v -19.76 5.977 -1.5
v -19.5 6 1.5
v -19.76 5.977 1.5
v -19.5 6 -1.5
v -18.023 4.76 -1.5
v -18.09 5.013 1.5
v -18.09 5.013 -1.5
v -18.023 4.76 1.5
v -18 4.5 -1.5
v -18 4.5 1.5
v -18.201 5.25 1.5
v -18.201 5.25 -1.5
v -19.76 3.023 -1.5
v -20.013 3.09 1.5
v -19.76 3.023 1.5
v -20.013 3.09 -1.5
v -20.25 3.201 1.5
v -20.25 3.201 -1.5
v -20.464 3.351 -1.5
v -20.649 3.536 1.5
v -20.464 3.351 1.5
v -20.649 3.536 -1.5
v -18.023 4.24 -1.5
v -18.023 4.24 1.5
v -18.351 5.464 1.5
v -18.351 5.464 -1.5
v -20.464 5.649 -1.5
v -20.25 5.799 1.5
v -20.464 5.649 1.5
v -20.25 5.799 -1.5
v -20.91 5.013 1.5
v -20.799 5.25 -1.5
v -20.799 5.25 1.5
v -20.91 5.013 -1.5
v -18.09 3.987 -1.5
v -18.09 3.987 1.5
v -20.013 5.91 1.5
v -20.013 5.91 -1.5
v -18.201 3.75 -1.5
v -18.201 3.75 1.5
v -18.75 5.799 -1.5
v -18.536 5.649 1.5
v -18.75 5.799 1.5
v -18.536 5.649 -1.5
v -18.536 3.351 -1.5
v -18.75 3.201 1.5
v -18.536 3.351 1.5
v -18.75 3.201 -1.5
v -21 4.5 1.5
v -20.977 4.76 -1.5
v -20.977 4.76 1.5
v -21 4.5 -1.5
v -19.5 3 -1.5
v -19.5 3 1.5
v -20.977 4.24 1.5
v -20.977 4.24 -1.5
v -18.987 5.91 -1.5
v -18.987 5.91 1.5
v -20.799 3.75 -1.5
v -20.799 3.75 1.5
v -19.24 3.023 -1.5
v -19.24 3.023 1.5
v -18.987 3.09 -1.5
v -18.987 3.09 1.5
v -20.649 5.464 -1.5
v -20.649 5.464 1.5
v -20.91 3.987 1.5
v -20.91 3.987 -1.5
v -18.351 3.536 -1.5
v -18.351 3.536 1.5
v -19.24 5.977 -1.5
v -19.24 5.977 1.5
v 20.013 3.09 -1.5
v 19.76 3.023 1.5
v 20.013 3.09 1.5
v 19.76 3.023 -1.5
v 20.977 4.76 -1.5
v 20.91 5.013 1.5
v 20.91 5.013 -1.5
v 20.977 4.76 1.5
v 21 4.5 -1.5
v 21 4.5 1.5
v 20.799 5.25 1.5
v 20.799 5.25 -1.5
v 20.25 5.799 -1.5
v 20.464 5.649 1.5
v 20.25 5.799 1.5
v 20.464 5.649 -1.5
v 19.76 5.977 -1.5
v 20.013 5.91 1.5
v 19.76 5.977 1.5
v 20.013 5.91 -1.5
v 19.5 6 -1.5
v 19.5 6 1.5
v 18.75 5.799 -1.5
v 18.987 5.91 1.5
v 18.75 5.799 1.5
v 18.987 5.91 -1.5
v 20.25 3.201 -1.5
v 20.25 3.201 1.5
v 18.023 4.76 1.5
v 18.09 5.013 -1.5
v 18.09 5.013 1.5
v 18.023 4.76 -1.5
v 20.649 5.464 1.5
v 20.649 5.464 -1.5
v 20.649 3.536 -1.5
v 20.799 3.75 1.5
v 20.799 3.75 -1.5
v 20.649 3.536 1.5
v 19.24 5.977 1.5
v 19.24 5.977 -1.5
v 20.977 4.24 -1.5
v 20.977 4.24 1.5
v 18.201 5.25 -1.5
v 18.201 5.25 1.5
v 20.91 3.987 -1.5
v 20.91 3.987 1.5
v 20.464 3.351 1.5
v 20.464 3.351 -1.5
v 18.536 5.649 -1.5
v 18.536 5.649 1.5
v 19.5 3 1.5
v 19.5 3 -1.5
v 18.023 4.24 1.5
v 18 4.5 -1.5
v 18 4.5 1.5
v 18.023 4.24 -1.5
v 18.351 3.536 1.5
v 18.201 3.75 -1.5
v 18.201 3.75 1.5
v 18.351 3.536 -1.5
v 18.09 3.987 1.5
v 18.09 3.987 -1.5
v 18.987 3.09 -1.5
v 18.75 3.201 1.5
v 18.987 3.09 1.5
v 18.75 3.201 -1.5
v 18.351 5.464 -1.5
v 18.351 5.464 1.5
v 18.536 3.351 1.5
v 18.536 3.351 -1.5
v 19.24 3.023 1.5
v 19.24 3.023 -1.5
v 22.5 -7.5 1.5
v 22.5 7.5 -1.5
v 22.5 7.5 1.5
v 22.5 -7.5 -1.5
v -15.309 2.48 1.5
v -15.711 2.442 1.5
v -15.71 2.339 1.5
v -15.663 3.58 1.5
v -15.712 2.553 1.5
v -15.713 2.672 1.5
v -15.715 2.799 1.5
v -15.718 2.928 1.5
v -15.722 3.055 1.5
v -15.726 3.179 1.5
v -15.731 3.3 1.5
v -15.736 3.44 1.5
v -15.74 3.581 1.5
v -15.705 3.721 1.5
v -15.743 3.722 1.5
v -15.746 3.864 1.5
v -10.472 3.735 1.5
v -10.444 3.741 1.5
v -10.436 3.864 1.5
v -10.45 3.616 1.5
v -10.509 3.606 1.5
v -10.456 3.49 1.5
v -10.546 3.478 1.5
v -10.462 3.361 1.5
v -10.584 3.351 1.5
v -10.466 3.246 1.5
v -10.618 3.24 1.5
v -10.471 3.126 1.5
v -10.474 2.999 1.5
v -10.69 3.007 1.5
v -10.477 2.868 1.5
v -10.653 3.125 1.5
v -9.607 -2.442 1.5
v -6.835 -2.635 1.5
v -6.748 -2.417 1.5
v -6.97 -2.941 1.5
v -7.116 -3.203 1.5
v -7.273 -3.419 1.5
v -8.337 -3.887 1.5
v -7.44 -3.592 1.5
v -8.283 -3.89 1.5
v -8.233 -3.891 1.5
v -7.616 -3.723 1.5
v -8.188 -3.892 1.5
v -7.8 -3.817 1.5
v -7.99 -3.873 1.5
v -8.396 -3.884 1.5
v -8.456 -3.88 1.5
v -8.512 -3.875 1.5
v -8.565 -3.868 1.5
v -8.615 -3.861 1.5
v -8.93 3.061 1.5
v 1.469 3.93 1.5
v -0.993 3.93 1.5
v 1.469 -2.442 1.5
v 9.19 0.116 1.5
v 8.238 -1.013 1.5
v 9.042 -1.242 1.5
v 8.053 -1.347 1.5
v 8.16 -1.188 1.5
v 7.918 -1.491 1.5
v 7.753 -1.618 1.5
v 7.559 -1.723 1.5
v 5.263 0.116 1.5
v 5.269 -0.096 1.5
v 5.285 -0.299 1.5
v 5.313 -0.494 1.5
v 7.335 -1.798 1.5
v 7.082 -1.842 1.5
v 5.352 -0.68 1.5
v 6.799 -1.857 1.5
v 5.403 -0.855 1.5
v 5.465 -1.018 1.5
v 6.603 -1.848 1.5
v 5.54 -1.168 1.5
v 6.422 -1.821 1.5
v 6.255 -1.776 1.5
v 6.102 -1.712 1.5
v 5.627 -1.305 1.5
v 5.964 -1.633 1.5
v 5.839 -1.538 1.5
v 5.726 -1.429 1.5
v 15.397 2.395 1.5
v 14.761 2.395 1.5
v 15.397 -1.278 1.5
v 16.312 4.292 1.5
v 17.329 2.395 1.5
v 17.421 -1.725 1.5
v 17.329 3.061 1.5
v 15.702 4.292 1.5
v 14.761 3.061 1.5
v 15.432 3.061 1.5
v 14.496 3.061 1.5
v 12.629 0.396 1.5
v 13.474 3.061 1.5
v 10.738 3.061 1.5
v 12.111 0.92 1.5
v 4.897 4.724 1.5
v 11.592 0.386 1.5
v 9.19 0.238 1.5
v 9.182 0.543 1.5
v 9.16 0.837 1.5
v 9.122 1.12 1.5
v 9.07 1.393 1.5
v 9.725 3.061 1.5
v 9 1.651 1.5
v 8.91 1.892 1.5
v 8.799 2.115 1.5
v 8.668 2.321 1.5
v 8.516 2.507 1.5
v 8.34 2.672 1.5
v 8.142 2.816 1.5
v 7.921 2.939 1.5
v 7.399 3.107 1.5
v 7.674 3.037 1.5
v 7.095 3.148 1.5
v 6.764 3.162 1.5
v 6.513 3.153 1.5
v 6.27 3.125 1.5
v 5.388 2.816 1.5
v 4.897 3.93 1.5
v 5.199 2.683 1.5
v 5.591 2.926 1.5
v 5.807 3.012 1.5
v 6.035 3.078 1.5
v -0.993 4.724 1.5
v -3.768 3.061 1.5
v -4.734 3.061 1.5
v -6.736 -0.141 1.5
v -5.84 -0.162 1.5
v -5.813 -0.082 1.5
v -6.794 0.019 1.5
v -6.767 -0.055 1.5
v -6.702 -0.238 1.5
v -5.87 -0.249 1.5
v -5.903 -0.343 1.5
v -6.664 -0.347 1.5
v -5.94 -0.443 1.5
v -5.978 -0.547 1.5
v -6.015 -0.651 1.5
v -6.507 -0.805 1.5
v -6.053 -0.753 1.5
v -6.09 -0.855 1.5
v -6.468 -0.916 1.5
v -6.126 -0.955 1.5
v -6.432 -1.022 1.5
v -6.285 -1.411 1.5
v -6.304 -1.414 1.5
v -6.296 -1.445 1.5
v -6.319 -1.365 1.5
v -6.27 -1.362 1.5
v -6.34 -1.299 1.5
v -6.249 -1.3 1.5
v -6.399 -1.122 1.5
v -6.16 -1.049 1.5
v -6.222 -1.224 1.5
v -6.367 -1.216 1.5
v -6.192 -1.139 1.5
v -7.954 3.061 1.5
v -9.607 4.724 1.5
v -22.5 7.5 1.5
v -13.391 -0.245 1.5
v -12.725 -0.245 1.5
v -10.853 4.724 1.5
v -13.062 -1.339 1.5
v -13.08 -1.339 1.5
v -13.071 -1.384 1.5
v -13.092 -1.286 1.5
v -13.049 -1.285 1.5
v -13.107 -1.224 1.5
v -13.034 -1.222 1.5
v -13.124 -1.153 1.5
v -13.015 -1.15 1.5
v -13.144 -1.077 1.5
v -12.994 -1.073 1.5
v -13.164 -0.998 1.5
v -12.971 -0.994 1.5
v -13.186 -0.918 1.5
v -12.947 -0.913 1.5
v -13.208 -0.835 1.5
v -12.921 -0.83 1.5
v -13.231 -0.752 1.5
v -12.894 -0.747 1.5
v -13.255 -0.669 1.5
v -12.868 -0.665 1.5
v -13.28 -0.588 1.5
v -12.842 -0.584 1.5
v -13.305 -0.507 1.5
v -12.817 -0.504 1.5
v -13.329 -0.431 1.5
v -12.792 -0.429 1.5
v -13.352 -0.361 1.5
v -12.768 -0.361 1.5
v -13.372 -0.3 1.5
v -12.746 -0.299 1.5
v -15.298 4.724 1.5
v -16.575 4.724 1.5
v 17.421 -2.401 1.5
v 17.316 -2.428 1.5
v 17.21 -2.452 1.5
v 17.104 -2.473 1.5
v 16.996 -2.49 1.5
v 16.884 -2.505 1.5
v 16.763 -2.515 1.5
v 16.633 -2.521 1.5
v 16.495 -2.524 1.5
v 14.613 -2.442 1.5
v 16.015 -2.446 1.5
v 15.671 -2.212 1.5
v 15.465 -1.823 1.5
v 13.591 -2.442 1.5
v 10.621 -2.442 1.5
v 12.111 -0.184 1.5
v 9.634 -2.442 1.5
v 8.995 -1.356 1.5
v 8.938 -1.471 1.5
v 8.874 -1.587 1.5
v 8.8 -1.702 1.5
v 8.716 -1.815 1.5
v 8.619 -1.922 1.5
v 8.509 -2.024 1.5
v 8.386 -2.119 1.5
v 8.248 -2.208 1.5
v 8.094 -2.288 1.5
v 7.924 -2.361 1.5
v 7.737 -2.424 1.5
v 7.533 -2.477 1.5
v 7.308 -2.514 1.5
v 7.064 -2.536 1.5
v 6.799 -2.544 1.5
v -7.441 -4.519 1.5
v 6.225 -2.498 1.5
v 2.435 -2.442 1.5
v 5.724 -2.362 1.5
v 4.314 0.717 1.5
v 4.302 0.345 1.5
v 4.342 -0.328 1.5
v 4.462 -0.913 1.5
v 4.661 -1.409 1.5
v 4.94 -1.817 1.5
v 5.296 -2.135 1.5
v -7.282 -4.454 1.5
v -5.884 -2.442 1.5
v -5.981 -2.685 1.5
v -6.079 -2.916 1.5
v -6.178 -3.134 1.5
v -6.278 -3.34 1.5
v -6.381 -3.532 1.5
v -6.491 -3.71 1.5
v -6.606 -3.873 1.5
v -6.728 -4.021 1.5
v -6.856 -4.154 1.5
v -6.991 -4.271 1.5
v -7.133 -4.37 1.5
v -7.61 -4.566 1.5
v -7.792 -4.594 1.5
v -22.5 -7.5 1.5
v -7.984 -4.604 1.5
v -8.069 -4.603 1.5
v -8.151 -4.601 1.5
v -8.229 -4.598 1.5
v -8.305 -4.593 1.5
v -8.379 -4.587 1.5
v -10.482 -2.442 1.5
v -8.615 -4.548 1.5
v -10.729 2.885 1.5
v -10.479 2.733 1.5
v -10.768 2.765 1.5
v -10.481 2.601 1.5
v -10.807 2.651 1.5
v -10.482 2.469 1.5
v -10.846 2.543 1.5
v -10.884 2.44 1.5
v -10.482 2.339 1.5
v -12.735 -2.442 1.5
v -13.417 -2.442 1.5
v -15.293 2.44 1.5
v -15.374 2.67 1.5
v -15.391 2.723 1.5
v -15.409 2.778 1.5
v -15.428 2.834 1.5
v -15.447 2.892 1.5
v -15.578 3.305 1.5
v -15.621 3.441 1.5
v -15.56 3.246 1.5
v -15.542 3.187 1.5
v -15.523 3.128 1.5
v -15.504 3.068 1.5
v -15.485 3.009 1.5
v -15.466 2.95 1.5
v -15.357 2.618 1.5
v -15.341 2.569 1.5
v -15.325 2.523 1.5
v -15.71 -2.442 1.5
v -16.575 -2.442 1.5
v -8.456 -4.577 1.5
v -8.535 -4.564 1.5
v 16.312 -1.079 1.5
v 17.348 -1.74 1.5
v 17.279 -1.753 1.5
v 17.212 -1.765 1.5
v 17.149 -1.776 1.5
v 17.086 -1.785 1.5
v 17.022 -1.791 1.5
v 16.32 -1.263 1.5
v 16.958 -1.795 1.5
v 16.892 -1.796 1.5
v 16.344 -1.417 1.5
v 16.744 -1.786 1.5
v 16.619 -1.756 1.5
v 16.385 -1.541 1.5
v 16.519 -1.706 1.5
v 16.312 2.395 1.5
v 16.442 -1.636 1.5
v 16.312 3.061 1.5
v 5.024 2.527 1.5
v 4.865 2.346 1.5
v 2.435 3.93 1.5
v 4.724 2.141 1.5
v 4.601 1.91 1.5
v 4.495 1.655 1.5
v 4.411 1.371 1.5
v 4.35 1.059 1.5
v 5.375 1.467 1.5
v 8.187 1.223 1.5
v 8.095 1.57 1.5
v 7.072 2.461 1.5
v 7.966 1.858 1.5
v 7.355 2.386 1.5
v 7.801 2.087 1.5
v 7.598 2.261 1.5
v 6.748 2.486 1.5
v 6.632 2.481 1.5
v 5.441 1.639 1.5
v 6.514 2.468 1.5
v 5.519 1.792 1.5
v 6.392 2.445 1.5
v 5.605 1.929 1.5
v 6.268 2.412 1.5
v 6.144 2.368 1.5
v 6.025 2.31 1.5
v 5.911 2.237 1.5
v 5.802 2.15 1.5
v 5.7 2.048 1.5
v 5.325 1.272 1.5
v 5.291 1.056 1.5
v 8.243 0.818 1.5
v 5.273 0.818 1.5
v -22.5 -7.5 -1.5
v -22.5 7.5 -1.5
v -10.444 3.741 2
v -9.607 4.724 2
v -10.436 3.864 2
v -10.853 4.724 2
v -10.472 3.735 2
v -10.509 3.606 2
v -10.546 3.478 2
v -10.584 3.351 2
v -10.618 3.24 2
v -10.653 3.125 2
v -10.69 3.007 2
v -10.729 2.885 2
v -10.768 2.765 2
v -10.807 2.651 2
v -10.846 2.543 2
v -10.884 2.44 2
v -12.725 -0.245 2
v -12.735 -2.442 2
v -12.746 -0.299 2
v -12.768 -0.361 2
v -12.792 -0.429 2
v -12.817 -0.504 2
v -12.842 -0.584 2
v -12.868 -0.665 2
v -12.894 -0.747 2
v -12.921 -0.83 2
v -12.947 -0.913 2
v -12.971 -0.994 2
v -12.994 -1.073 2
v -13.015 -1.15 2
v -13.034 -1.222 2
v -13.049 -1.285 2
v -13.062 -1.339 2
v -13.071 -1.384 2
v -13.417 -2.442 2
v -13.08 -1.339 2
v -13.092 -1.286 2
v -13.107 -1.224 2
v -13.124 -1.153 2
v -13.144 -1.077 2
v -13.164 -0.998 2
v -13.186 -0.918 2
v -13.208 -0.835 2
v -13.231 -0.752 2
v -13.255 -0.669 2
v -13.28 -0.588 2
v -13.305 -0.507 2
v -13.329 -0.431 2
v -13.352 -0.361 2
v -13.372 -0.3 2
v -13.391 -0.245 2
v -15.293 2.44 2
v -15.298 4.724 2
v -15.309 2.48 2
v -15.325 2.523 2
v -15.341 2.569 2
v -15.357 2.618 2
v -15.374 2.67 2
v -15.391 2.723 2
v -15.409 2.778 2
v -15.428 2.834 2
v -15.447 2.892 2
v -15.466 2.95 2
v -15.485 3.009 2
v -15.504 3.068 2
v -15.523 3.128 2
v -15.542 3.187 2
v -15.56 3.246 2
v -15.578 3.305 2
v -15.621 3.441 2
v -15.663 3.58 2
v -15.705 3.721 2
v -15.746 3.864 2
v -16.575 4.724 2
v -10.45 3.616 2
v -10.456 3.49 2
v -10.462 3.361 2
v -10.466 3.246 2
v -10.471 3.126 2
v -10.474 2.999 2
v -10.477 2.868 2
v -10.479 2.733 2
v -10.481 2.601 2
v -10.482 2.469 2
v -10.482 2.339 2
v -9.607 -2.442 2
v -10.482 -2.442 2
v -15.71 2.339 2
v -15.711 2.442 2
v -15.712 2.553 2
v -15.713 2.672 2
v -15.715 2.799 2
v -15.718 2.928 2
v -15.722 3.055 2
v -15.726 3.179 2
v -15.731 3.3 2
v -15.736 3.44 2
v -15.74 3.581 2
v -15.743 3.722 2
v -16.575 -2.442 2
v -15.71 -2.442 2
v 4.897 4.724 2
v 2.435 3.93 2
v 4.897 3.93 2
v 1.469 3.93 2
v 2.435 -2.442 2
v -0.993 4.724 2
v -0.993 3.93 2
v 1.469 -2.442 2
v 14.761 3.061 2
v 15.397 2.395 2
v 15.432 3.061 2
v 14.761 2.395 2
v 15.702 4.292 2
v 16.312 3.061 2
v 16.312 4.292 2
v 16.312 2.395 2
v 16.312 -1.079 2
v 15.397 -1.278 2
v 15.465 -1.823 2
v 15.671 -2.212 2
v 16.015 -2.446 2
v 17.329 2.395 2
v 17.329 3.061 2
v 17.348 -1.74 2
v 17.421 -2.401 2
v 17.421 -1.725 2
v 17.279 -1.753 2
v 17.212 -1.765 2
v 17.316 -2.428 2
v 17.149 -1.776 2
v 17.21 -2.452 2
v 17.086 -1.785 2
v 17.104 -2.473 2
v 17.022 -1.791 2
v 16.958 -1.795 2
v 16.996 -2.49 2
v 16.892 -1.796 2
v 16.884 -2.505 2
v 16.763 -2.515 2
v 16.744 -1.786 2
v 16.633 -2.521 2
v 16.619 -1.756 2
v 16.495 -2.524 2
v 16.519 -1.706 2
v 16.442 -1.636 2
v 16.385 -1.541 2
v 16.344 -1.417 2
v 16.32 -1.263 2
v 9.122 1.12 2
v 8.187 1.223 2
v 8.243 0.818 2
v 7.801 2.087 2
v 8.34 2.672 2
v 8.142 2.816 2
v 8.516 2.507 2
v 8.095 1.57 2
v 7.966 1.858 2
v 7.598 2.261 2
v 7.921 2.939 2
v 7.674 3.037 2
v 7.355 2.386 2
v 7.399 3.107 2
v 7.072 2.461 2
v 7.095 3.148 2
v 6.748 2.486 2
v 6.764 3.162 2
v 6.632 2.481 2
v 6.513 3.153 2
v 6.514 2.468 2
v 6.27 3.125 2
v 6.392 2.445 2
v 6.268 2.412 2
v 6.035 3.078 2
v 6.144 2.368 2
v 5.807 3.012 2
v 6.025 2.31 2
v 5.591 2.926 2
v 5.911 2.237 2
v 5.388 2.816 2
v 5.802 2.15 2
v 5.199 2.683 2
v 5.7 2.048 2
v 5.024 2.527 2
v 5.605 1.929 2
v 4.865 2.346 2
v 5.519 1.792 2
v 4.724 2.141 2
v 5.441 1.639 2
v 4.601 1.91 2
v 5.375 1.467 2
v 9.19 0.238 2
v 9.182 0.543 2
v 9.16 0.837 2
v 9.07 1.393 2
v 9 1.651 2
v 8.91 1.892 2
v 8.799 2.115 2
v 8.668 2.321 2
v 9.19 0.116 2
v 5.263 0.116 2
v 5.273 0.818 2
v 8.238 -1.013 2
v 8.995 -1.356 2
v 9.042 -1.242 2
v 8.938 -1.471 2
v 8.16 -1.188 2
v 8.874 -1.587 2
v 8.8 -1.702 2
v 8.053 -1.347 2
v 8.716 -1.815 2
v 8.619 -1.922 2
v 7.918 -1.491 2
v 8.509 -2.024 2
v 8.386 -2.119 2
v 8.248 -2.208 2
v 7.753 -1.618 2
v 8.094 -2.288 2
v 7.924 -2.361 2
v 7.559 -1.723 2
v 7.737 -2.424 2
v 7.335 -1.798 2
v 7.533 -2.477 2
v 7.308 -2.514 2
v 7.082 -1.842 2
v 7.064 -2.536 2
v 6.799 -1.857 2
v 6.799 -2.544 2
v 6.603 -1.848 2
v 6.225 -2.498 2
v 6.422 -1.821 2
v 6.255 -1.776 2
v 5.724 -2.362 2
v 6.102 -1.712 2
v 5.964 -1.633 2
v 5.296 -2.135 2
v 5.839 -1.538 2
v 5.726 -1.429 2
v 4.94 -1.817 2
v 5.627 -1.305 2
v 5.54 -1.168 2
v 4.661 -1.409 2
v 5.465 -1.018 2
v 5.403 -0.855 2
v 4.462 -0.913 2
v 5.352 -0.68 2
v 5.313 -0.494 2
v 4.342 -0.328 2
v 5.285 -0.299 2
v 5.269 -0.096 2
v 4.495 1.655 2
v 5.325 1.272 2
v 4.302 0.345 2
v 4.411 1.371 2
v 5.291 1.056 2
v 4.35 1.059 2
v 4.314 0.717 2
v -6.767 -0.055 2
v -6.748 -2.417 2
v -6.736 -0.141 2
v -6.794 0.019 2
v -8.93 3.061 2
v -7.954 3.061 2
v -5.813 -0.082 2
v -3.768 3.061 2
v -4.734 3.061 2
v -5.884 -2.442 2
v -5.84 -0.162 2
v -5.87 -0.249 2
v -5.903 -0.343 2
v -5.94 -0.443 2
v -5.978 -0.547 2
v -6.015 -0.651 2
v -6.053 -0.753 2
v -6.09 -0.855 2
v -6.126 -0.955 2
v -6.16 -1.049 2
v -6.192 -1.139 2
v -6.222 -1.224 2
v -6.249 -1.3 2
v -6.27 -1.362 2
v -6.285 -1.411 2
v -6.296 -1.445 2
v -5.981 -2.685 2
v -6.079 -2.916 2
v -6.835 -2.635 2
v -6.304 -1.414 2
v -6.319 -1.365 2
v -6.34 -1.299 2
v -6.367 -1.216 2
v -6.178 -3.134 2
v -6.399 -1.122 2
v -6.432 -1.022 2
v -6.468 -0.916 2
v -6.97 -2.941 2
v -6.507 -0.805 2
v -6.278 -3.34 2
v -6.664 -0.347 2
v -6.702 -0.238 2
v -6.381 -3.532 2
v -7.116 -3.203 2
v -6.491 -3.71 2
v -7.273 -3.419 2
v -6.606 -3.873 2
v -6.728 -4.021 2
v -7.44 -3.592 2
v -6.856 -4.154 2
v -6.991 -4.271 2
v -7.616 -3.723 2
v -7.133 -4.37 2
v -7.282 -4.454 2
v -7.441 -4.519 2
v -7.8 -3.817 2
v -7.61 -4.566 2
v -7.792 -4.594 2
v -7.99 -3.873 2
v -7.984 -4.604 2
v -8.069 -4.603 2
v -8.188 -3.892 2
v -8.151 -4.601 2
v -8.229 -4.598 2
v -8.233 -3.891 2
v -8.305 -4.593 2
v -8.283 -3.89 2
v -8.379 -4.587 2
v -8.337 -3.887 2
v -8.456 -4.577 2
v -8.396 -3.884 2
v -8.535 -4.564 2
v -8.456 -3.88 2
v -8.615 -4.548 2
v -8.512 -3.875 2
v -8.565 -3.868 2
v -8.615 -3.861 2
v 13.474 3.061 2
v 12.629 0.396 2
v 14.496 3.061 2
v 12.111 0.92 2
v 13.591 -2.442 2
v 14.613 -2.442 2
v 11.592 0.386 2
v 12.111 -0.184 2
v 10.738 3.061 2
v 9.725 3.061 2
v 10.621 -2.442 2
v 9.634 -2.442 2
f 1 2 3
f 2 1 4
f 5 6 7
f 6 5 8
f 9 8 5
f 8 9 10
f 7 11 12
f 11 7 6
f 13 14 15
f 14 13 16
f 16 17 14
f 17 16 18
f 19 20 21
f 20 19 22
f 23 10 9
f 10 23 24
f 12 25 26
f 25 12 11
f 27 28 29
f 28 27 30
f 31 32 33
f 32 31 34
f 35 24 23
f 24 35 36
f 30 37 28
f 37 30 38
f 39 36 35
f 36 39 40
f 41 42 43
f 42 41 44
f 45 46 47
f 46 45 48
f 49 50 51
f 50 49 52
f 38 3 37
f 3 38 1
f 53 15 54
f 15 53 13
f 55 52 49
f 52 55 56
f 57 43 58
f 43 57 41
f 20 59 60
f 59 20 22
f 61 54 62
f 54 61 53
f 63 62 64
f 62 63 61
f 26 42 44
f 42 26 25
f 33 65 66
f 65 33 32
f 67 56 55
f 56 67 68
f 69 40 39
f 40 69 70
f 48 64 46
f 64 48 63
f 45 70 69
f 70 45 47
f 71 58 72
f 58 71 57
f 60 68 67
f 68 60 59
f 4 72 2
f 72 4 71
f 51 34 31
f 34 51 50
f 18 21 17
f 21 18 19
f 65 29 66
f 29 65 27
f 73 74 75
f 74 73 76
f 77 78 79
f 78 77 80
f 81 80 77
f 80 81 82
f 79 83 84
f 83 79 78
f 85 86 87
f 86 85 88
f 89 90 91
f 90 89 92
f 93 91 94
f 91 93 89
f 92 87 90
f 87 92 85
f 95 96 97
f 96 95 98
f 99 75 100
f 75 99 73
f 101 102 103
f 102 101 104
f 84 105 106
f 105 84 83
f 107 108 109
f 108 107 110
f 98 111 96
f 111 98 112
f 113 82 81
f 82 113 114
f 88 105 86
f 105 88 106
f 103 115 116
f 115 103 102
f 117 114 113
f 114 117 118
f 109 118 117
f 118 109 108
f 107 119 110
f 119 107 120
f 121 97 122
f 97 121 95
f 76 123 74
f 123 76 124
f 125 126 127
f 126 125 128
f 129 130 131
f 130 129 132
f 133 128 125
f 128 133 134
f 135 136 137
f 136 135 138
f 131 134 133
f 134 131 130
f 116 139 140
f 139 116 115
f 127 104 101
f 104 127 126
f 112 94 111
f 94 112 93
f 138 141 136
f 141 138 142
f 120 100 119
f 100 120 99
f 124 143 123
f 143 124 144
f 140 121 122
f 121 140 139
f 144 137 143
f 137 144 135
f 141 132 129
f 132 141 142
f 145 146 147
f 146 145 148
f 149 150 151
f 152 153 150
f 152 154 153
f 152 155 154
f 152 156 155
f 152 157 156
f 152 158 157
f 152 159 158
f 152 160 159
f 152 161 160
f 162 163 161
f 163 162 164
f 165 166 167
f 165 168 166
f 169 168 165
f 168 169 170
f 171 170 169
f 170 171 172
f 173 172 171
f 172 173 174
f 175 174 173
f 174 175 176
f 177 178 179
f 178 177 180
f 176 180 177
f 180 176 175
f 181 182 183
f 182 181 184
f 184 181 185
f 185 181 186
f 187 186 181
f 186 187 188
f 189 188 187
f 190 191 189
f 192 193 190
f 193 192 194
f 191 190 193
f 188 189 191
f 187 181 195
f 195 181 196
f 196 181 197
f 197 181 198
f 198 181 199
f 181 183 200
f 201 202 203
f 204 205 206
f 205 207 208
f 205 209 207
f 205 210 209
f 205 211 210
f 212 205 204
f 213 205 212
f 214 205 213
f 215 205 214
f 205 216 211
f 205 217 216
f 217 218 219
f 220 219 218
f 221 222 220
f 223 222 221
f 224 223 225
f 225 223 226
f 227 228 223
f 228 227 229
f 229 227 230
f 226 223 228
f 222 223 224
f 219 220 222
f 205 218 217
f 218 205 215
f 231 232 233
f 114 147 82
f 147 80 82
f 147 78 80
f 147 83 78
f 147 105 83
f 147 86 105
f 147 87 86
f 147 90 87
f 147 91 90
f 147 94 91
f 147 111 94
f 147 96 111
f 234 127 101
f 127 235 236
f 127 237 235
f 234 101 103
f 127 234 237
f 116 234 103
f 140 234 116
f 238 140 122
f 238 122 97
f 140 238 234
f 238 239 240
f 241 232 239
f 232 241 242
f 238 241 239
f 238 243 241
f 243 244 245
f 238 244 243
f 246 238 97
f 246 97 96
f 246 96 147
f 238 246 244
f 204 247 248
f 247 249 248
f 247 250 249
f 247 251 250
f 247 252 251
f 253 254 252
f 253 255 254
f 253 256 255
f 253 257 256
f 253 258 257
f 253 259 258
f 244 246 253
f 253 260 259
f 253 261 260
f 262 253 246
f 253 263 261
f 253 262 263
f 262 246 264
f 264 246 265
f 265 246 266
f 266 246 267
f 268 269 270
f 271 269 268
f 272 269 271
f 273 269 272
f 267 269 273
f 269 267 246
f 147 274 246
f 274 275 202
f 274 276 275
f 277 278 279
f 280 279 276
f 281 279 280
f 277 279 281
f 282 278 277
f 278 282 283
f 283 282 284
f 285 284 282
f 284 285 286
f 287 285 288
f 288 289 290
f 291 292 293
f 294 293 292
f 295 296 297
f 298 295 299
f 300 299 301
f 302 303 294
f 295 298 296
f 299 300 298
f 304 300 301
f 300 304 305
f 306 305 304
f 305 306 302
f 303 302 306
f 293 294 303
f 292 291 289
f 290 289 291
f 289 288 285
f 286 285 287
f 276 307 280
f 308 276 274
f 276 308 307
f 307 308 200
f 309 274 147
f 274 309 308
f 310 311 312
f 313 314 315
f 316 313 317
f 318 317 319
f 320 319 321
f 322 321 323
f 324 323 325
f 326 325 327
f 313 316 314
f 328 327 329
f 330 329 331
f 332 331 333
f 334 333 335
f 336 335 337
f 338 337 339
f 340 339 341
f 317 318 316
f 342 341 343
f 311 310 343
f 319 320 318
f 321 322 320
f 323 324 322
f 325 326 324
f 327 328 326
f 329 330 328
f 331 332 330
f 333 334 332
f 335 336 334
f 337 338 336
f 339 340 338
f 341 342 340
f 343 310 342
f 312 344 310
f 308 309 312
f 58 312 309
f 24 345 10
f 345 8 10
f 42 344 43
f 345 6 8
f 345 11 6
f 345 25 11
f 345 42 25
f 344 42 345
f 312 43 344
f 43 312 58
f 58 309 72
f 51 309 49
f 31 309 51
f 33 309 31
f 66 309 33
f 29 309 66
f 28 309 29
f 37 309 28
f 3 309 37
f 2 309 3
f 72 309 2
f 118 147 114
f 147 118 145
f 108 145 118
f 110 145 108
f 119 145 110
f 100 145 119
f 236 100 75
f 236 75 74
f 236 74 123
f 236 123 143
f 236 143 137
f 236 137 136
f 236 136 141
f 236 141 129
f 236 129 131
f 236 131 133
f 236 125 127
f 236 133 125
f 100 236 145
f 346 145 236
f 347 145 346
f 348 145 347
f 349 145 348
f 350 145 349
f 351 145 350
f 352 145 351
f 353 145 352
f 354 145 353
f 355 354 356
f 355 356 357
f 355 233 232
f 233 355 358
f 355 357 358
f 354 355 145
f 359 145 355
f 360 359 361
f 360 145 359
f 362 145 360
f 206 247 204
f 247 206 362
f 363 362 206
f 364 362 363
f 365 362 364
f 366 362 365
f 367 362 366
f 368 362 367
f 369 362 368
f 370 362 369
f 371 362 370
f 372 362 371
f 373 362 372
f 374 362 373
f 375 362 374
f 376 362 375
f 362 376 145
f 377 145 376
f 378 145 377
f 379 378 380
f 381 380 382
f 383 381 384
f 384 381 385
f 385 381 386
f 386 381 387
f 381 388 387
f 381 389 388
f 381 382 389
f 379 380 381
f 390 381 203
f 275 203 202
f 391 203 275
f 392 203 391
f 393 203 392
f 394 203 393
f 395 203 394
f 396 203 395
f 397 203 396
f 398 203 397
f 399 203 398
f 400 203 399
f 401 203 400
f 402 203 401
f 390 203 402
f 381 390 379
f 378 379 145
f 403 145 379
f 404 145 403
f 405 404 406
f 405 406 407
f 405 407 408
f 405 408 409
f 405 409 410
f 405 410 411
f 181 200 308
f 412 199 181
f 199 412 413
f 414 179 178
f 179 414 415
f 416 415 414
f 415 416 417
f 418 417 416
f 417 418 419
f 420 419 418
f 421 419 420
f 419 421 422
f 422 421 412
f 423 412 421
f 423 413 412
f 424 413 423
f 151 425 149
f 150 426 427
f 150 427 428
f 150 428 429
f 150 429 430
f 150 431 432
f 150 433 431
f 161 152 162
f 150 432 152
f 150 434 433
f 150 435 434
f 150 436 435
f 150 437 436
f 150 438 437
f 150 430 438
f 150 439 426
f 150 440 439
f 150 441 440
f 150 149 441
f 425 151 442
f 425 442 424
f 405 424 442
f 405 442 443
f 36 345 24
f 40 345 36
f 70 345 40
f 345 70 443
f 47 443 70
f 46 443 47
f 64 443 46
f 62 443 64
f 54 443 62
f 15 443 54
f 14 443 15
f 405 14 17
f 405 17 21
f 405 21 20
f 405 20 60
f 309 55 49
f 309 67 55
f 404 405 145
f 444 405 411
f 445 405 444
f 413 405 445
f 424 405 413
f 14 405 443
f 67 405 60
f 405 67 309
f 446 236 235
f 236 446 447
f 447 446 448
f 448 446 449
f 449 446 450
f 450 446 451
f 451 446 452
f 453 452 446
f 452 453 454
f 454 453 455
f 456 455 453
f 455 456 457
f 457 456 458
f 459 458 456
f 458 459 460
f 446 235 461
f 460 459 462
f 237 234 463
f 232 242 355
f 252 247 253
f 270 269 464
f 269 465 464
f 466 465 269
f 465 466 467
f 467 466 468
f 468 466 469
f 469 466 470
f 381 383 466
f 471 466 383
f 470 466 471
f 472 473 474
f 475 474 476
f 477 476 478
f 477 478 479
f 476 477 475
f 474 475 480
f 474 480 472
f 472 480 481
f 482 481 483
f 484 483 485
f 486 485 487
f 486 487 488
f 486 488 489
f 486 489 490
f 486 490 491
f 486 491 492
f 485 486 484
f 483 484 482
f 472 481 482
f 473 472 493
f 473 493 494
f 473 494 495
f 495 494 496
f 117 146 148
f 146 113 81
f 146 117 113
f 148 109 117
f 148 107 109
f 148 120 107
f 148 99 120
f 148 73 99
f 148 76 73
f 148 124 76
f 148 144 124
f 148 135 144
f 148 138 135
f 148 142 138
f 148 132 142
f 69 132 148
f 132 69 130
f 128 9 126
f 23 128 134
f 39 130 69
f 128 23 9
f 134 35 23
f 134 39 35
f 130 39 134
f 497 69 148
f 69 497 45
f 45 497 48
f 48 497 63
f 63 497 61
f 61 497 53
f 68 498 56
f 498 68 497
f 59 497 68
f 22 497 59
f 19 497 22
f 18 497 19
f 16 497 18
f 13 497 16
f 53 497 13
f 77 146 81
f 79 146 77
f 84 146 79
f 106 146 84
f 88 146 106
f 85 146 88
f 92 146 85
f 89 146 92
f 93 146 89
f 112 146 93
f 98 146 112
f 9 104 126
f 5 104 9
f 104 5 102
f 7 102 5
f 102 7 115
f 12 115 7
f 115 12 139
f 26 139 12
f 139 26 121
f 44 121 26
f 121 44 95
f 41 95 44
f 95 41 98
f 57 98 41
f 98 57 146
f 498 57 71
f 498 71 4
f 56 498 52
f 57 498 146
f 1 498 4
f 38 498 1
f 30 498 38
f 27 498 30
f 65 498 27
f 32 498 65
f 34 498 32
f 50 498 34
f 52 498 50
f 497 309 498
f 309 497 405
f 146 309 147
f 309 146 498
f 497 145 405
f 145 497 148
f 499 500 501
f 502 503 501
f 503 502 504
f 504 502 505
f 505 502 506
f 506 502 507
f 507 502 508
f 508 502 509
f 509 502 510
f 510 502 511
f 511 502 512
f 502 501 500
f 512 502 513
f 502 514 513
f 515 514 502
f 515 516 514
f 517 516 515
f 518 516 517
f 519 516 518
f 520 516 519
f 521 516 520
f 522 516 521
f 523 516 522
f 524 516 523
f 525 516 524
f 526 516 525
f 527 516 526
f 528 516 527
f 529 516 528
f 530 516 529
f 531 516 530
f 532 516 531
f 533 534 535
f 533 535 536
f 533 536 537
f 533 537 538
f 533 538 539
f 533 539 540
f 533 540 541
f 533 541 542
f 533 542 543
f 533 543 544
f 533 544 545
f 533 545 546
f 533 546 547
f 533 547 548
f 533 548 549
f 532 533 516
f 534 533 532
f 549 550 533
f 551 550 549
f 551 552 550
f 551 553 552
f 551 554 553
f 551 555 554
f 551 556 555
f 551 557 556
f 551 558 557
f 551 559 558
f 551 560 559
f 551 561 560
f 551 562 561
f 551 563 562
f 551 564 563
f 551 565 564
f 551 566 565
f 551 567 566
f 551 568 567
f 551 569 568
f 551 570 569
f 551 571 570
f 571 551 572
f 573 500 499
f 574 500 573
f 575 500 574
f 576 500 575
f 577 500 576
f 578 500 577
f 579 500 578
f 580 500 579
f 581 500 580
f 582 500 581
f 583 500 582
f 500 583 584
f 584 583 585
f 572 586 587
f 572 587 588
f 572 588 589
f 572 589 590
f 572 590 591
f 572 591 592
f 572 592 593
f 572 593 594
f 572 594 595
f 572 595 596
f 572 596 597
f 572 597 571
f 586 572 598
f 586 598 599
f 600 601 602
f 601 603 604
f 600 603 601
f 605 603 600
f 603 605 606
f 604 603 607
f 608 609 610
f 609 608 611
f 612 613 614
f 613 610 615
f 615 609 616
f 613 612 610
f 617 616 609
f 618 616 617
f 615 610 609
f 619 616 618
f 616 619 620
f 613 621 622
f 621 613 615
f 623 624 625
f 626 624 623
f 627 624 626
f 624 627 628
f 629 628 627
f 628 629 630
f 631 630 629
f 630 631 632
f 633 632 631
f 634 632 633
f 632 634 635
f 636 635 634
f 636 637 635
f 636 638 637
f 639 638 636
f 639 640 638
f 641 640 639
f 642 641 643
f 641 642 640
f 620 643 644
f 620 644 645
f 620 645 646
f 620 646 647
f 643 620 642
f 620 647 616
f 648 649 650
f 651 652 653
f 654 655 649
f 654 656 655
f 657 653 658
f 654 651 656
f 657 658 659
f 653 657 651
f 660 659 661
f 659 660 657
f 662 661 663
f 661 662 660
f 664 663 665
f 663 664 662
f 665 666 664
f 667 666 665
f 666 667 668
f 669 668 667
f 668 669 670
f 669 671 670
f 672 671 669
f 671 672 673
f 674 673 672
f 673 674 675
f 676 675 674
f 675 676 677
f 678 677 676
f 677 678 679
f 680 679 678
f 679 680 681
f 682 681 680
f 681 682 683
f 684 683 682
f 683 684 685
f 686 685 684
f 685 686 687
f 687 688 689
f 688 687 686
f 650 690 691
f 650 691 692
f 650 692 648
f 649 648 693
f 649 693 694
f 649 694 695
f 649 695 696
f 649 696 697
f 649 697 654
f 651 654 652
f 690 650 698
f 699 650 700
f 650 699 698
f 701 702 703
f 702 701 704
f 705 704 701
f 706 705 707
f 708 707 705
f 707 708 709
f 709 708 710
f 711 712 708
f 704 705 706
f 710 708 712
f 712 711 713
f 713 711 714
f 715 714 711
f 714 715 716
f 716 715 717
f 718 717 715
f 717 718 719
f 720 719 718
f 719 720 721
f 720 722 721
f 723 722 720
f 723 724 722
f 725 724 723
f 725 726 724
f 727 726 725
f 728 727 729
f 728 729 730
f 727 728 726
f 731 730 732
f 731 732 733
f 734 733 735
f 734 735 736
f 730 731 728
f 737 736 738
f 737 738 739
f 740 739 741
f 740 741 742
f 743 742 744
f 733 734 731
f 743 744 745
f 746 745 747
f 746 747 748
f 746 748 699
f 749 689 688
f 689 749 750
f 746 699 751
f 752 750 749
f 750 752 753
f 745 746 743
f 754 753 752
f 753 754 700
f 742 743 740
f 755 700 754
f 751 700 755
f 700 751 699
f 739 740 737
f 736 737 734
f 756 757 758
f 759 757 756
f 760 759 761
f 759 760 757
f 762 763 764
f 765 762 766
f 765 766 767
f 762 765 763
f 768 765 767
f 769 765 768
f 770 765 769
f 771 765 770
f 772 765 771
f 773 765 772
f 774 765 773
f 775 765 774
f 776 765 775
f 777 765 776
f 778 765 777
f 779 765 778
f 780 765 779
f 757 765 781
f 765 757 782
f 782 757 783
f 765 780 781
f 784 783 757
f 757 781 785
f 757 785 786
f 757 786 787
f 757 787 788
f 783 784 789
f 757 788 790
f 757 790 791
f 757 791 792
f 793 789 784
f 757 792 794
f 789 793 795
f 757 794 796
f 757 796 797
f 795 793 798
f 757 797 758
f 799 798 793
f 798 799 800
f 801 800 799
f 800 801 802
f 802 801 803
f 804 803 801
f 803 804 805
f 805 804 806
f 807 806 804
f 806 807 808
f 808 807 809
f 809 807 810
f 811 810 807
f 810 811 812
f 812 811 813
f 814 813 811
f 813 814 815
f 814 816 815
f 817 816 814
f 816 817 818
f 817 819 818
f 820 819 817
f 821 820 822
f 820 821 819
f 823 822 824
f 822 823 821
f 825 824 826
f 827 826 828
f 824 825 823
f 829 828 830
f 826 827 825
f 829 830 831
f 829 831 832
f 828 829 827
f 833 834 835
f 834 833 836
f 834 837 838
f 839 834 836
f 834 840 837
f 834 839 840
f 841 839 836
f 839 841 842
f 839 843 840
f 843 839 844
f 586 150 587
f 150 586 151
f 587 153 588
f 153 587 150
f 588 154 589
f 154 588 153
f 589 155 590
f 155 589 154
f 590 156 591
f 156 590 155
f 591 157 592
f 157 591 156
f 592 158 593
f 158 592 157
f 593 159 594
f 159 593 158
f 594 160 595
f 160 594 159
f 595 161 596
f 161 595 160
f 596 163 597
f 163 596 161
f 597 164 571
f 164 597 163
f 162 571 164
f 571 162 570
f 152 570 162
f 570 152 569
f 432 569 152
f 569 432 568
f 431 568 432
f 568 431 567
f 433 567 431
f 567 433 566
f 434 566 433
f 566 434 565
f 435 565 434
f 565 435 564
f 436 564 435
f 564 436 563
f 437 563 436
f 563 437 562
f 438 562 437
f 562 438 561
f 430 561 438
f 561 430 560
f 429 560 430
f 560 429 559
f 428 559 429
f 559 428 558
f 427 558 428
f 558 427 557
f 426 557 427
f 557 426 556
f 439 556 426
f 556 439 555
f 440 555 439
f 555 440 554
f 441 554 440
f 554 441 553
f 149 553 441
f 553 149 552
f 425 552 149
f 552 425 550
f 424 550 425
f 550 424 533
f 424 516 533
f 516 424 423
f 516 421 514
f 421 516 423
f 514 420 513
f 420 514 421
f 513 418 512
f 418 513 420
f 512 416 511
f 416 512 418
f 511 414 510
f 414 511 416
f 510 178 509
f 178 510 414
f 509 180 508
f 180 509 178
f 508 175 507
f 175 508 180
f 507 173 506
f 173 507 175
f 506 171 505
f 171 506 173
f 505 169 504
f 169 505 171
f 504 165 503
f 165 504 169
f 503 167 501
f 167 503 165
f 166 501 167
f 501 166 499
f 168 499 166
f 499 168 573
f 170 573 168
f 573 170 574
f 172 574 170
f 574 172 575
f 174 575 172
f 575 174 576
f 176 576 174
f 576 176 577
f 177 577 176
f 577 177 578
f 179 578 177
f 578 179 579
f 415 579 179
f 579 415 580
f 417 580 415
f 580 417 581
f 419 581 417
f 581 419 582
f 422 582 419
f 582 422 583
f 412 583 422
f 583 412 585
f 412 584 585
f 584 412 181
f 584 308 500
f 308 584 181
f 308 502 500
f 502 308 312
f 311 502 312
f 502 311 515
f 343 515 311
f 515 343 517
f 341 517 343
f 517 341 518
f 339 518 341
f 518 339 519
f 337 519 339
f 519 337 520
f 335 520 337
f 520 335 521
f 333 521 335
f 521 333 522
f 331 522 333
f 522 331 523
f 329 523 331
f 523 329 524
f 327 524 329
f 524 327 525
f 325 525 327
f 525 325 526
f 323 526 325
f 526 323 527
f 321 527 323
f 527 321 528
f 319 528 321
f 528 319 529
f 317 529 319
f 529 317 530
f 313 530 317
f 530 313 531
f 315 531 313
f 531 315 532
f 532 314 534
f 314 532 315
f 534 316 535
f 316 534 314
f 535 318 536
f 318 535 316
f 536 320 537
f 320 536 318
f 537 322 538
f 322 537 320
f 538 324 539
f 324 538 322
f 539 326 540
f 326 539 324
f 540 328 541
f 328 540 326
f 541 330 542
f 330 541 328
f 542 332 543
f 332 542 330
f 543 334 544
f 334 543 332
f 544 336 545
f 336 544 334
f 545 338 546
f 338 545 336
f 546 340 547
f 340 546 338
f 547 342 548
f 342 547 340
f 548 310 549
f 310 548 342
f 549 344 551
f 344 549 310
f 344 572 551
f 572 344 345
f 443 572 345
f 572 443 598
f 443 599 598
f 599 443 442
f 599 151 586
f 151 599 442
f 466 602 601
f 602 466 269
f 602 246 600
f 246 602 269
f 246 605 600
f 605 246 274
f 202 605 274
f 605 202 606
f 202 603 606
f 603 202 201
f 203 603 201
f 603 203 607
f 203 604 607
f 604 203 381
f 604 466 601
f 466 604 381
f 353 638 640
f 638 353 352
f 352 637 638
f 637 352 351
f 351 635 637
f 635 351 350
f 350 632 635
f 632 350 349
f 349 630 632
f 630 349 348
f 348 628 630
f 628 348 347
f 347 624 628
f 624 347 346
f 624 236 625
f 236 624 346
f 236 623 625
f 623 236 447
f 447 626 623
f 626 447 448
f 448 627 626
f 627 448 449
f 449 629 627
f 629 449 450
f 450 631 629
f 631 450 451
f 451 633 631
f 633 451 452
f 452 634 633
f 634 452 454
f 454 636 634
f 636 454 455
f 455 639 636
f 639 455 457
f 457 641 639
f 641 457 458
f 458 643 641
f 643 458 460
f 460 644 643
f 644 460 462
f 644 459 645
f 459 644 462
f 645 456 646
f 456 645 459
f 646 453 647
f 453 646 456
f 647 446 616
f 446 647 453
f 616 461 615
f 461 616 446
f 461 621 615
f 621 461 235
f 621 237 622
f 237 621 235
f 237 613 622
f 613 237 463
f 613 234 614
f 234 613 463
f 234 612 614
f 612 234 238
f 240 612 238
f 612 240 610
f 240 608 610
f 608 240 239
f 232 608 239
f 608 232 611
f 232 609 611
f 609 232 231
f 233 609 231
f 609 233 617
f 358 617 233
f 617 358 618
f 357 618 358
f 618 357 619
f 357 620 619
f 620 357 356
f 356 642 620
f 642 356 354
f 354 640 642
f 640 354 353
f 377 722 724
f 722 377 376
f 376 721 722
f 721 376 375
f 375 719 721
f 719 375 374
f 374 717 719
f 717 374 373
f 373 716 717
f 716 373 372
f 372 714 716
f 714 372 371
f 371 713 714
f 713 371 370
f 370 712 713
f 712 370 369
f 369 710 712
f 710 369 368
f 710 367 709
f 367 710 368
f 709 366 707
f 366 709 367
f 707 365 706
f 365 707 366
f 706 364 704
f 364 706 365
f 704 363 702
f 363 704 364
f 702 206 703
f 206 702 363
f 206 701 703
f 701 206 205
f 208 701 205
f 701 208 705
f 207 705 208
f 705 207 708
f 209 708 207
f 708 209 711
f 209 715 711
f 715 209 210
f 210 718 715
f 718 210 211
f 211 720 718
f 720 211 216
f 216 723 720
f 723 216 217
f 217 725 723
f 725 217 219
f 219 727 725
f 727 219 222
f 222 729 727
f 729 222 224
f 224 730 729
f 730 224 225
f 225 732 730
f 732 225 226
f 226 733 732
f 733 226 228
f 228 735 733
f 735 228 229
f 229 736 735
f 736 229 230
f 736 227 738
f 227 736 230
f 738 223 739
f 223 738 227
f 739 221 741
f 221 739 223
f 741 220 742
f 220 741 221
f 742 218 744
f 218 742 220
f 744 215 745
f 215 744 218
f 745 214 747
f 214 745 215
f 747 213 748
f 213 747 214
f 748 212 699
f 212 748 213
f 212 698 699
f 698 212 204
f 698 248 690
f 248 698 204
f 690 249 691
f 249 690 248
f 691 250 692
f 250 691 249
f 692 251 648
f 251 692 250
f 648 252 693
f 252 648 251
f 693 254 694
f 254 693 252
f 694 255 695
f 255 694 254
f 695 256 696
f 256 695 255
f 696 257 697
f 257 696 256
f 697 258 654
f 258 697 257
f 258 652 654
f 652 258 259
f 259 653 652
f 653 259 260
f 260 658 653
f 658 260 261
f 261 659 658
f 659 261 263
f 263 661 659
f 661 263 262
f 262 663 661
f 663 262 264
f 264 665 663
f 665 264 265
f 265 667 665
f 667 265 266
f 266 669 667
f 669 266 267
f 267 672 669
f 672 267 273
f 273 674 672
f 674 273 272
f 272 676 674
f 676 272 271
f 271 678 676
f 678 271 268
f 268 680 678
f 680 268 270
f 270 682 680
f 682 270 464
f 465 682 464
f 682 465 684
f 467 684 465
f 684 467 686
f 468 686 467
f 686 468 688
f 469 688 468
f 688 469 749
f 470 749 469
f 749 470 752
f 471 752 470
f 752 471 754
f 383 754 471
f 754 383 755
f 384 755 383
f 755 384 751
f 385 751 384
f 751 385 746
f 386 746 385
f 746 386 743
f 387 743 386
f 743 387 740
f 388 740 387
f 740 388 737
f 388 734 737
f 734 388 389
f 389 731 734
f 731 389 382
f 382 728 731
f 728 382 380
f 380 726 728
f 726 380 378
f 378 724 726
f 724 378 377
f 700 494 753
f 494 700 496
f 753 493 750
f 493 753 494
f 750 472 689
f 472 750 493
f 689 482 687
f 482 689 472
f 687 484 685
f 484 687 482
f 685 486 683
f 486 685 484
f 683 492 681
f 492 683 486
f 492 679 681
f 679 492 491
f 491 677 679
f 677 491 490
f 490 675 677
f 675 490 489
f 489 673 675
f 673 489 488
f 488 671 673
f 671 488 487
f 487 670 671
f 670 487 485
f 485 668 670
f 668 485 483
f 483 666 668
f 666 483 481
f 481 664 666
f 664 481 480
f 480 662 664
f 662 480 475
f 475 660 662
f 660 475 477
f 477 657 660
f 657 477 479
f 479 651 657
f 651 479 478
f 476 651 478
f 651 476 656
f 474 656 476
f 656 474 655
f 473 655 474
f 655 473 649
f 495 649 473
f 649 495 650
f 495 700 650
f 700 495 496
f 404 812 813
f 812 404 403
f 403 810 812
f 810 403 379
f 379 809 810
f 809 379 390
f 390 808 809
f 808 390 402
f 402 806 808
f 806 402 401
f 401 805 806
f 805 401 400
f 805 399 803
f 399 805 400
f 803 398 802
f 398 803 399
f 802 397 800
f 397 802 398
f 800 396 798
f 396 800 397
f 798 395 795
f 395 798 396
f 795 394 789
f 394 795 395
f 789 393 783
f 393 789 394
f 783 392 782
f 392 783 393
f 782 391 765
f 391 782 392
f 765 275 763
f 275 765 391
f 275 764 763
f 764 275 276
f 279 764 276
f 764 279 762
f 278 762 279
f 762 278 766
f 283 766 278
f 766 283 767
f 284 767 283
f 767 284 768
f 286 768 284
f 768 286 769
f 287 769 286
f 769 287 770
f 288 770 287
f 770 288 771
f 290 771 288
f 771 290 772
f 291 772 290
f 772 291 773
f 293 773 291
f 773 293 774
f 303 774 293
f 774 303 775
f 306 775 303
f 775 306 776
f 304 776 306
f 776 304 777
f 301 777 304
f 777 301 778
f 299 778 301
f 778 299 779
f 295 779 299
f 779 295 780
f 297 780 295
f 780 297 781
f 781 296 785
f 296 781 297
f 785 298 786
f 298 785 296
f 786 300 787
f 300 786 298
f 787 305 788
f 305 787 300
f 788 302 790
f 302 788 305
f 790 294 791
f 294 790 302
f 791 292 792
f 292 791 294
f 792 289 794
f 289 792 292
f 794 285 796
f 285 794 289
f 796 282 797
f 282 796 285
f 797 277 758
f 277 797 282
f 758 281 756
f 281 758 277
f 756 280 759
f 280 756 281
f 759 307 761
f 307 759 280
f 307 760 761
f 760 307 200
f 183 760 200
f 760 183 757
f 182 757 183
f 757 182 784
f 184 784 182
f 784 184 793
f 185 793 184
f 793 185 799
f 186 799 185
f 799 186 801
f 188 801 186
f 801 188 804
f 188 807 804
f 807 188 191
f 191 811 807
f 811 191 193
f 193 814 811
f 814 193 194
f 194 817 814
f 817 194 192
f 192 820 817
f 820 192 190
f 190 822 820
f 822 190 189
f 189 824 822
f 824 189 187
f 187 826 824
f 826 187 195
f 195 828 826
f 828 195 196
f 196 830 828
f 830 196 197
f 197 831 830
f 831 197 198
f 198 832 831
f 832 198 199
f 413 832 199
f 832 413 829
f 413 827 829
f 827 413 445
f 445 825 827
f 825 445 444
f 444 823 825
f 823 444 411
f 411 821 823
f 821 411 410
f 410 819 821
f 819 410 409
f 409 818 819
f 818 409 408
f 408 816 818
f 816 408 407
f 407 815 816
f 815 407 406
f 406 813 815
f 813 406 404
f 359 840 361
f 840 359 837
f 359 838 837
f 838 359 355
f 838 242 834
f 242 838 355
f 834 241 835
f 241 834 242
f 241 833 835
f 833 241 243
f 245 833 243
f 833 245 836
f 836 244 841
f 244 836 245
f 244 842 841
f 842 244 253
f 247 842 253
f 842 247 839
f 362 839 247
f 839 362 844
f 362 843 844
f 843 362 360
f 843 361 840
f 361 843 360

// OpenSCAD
/* [Base] */
//length of name tag
xSize=45; //[30:100]
//width of name tag
ySize=15; //[5:40]
//thickness of name tag
zSize=3; //[3,5,7]
//hole diameter
holeDiameter = 3;// [3,4,5,6]

/* [Text] */
//height above base
textHeight = 2; // [1,2,3,5]
//text size
textSize = 7.5; // [3:35] 
// font for text
myFont = "Liberation Sans";
//text to put on plate
textInput = "My Text";

module base() {
    
    cube ([xSize, ySize, zSize], center = true);
    
    
        
}

module holes(){
    holeRadius = holeDiameter/2; 
        translate([-xSize/2+holeDiameter, ySize/2-holeDiameter, 0])
    
        #cylinder (r = holeRadius, h = 2*zSize, $fn = 36, center = true);
    
        translate([+xSize/2-holeDiameter, ySize/2-holeDiameter, 0])
    
        #cylinder (r = holeRadius, h = 2*zSize, $fn = 36, center = true);
}
difference() {
base();
holes();
}
module textExtrude(){
    
    linear_extrude(height = textHeight) text(textInput, halign = "center", valign = "center", size = textSize, font = myFont);
    
     
    
}
textExtrude();
